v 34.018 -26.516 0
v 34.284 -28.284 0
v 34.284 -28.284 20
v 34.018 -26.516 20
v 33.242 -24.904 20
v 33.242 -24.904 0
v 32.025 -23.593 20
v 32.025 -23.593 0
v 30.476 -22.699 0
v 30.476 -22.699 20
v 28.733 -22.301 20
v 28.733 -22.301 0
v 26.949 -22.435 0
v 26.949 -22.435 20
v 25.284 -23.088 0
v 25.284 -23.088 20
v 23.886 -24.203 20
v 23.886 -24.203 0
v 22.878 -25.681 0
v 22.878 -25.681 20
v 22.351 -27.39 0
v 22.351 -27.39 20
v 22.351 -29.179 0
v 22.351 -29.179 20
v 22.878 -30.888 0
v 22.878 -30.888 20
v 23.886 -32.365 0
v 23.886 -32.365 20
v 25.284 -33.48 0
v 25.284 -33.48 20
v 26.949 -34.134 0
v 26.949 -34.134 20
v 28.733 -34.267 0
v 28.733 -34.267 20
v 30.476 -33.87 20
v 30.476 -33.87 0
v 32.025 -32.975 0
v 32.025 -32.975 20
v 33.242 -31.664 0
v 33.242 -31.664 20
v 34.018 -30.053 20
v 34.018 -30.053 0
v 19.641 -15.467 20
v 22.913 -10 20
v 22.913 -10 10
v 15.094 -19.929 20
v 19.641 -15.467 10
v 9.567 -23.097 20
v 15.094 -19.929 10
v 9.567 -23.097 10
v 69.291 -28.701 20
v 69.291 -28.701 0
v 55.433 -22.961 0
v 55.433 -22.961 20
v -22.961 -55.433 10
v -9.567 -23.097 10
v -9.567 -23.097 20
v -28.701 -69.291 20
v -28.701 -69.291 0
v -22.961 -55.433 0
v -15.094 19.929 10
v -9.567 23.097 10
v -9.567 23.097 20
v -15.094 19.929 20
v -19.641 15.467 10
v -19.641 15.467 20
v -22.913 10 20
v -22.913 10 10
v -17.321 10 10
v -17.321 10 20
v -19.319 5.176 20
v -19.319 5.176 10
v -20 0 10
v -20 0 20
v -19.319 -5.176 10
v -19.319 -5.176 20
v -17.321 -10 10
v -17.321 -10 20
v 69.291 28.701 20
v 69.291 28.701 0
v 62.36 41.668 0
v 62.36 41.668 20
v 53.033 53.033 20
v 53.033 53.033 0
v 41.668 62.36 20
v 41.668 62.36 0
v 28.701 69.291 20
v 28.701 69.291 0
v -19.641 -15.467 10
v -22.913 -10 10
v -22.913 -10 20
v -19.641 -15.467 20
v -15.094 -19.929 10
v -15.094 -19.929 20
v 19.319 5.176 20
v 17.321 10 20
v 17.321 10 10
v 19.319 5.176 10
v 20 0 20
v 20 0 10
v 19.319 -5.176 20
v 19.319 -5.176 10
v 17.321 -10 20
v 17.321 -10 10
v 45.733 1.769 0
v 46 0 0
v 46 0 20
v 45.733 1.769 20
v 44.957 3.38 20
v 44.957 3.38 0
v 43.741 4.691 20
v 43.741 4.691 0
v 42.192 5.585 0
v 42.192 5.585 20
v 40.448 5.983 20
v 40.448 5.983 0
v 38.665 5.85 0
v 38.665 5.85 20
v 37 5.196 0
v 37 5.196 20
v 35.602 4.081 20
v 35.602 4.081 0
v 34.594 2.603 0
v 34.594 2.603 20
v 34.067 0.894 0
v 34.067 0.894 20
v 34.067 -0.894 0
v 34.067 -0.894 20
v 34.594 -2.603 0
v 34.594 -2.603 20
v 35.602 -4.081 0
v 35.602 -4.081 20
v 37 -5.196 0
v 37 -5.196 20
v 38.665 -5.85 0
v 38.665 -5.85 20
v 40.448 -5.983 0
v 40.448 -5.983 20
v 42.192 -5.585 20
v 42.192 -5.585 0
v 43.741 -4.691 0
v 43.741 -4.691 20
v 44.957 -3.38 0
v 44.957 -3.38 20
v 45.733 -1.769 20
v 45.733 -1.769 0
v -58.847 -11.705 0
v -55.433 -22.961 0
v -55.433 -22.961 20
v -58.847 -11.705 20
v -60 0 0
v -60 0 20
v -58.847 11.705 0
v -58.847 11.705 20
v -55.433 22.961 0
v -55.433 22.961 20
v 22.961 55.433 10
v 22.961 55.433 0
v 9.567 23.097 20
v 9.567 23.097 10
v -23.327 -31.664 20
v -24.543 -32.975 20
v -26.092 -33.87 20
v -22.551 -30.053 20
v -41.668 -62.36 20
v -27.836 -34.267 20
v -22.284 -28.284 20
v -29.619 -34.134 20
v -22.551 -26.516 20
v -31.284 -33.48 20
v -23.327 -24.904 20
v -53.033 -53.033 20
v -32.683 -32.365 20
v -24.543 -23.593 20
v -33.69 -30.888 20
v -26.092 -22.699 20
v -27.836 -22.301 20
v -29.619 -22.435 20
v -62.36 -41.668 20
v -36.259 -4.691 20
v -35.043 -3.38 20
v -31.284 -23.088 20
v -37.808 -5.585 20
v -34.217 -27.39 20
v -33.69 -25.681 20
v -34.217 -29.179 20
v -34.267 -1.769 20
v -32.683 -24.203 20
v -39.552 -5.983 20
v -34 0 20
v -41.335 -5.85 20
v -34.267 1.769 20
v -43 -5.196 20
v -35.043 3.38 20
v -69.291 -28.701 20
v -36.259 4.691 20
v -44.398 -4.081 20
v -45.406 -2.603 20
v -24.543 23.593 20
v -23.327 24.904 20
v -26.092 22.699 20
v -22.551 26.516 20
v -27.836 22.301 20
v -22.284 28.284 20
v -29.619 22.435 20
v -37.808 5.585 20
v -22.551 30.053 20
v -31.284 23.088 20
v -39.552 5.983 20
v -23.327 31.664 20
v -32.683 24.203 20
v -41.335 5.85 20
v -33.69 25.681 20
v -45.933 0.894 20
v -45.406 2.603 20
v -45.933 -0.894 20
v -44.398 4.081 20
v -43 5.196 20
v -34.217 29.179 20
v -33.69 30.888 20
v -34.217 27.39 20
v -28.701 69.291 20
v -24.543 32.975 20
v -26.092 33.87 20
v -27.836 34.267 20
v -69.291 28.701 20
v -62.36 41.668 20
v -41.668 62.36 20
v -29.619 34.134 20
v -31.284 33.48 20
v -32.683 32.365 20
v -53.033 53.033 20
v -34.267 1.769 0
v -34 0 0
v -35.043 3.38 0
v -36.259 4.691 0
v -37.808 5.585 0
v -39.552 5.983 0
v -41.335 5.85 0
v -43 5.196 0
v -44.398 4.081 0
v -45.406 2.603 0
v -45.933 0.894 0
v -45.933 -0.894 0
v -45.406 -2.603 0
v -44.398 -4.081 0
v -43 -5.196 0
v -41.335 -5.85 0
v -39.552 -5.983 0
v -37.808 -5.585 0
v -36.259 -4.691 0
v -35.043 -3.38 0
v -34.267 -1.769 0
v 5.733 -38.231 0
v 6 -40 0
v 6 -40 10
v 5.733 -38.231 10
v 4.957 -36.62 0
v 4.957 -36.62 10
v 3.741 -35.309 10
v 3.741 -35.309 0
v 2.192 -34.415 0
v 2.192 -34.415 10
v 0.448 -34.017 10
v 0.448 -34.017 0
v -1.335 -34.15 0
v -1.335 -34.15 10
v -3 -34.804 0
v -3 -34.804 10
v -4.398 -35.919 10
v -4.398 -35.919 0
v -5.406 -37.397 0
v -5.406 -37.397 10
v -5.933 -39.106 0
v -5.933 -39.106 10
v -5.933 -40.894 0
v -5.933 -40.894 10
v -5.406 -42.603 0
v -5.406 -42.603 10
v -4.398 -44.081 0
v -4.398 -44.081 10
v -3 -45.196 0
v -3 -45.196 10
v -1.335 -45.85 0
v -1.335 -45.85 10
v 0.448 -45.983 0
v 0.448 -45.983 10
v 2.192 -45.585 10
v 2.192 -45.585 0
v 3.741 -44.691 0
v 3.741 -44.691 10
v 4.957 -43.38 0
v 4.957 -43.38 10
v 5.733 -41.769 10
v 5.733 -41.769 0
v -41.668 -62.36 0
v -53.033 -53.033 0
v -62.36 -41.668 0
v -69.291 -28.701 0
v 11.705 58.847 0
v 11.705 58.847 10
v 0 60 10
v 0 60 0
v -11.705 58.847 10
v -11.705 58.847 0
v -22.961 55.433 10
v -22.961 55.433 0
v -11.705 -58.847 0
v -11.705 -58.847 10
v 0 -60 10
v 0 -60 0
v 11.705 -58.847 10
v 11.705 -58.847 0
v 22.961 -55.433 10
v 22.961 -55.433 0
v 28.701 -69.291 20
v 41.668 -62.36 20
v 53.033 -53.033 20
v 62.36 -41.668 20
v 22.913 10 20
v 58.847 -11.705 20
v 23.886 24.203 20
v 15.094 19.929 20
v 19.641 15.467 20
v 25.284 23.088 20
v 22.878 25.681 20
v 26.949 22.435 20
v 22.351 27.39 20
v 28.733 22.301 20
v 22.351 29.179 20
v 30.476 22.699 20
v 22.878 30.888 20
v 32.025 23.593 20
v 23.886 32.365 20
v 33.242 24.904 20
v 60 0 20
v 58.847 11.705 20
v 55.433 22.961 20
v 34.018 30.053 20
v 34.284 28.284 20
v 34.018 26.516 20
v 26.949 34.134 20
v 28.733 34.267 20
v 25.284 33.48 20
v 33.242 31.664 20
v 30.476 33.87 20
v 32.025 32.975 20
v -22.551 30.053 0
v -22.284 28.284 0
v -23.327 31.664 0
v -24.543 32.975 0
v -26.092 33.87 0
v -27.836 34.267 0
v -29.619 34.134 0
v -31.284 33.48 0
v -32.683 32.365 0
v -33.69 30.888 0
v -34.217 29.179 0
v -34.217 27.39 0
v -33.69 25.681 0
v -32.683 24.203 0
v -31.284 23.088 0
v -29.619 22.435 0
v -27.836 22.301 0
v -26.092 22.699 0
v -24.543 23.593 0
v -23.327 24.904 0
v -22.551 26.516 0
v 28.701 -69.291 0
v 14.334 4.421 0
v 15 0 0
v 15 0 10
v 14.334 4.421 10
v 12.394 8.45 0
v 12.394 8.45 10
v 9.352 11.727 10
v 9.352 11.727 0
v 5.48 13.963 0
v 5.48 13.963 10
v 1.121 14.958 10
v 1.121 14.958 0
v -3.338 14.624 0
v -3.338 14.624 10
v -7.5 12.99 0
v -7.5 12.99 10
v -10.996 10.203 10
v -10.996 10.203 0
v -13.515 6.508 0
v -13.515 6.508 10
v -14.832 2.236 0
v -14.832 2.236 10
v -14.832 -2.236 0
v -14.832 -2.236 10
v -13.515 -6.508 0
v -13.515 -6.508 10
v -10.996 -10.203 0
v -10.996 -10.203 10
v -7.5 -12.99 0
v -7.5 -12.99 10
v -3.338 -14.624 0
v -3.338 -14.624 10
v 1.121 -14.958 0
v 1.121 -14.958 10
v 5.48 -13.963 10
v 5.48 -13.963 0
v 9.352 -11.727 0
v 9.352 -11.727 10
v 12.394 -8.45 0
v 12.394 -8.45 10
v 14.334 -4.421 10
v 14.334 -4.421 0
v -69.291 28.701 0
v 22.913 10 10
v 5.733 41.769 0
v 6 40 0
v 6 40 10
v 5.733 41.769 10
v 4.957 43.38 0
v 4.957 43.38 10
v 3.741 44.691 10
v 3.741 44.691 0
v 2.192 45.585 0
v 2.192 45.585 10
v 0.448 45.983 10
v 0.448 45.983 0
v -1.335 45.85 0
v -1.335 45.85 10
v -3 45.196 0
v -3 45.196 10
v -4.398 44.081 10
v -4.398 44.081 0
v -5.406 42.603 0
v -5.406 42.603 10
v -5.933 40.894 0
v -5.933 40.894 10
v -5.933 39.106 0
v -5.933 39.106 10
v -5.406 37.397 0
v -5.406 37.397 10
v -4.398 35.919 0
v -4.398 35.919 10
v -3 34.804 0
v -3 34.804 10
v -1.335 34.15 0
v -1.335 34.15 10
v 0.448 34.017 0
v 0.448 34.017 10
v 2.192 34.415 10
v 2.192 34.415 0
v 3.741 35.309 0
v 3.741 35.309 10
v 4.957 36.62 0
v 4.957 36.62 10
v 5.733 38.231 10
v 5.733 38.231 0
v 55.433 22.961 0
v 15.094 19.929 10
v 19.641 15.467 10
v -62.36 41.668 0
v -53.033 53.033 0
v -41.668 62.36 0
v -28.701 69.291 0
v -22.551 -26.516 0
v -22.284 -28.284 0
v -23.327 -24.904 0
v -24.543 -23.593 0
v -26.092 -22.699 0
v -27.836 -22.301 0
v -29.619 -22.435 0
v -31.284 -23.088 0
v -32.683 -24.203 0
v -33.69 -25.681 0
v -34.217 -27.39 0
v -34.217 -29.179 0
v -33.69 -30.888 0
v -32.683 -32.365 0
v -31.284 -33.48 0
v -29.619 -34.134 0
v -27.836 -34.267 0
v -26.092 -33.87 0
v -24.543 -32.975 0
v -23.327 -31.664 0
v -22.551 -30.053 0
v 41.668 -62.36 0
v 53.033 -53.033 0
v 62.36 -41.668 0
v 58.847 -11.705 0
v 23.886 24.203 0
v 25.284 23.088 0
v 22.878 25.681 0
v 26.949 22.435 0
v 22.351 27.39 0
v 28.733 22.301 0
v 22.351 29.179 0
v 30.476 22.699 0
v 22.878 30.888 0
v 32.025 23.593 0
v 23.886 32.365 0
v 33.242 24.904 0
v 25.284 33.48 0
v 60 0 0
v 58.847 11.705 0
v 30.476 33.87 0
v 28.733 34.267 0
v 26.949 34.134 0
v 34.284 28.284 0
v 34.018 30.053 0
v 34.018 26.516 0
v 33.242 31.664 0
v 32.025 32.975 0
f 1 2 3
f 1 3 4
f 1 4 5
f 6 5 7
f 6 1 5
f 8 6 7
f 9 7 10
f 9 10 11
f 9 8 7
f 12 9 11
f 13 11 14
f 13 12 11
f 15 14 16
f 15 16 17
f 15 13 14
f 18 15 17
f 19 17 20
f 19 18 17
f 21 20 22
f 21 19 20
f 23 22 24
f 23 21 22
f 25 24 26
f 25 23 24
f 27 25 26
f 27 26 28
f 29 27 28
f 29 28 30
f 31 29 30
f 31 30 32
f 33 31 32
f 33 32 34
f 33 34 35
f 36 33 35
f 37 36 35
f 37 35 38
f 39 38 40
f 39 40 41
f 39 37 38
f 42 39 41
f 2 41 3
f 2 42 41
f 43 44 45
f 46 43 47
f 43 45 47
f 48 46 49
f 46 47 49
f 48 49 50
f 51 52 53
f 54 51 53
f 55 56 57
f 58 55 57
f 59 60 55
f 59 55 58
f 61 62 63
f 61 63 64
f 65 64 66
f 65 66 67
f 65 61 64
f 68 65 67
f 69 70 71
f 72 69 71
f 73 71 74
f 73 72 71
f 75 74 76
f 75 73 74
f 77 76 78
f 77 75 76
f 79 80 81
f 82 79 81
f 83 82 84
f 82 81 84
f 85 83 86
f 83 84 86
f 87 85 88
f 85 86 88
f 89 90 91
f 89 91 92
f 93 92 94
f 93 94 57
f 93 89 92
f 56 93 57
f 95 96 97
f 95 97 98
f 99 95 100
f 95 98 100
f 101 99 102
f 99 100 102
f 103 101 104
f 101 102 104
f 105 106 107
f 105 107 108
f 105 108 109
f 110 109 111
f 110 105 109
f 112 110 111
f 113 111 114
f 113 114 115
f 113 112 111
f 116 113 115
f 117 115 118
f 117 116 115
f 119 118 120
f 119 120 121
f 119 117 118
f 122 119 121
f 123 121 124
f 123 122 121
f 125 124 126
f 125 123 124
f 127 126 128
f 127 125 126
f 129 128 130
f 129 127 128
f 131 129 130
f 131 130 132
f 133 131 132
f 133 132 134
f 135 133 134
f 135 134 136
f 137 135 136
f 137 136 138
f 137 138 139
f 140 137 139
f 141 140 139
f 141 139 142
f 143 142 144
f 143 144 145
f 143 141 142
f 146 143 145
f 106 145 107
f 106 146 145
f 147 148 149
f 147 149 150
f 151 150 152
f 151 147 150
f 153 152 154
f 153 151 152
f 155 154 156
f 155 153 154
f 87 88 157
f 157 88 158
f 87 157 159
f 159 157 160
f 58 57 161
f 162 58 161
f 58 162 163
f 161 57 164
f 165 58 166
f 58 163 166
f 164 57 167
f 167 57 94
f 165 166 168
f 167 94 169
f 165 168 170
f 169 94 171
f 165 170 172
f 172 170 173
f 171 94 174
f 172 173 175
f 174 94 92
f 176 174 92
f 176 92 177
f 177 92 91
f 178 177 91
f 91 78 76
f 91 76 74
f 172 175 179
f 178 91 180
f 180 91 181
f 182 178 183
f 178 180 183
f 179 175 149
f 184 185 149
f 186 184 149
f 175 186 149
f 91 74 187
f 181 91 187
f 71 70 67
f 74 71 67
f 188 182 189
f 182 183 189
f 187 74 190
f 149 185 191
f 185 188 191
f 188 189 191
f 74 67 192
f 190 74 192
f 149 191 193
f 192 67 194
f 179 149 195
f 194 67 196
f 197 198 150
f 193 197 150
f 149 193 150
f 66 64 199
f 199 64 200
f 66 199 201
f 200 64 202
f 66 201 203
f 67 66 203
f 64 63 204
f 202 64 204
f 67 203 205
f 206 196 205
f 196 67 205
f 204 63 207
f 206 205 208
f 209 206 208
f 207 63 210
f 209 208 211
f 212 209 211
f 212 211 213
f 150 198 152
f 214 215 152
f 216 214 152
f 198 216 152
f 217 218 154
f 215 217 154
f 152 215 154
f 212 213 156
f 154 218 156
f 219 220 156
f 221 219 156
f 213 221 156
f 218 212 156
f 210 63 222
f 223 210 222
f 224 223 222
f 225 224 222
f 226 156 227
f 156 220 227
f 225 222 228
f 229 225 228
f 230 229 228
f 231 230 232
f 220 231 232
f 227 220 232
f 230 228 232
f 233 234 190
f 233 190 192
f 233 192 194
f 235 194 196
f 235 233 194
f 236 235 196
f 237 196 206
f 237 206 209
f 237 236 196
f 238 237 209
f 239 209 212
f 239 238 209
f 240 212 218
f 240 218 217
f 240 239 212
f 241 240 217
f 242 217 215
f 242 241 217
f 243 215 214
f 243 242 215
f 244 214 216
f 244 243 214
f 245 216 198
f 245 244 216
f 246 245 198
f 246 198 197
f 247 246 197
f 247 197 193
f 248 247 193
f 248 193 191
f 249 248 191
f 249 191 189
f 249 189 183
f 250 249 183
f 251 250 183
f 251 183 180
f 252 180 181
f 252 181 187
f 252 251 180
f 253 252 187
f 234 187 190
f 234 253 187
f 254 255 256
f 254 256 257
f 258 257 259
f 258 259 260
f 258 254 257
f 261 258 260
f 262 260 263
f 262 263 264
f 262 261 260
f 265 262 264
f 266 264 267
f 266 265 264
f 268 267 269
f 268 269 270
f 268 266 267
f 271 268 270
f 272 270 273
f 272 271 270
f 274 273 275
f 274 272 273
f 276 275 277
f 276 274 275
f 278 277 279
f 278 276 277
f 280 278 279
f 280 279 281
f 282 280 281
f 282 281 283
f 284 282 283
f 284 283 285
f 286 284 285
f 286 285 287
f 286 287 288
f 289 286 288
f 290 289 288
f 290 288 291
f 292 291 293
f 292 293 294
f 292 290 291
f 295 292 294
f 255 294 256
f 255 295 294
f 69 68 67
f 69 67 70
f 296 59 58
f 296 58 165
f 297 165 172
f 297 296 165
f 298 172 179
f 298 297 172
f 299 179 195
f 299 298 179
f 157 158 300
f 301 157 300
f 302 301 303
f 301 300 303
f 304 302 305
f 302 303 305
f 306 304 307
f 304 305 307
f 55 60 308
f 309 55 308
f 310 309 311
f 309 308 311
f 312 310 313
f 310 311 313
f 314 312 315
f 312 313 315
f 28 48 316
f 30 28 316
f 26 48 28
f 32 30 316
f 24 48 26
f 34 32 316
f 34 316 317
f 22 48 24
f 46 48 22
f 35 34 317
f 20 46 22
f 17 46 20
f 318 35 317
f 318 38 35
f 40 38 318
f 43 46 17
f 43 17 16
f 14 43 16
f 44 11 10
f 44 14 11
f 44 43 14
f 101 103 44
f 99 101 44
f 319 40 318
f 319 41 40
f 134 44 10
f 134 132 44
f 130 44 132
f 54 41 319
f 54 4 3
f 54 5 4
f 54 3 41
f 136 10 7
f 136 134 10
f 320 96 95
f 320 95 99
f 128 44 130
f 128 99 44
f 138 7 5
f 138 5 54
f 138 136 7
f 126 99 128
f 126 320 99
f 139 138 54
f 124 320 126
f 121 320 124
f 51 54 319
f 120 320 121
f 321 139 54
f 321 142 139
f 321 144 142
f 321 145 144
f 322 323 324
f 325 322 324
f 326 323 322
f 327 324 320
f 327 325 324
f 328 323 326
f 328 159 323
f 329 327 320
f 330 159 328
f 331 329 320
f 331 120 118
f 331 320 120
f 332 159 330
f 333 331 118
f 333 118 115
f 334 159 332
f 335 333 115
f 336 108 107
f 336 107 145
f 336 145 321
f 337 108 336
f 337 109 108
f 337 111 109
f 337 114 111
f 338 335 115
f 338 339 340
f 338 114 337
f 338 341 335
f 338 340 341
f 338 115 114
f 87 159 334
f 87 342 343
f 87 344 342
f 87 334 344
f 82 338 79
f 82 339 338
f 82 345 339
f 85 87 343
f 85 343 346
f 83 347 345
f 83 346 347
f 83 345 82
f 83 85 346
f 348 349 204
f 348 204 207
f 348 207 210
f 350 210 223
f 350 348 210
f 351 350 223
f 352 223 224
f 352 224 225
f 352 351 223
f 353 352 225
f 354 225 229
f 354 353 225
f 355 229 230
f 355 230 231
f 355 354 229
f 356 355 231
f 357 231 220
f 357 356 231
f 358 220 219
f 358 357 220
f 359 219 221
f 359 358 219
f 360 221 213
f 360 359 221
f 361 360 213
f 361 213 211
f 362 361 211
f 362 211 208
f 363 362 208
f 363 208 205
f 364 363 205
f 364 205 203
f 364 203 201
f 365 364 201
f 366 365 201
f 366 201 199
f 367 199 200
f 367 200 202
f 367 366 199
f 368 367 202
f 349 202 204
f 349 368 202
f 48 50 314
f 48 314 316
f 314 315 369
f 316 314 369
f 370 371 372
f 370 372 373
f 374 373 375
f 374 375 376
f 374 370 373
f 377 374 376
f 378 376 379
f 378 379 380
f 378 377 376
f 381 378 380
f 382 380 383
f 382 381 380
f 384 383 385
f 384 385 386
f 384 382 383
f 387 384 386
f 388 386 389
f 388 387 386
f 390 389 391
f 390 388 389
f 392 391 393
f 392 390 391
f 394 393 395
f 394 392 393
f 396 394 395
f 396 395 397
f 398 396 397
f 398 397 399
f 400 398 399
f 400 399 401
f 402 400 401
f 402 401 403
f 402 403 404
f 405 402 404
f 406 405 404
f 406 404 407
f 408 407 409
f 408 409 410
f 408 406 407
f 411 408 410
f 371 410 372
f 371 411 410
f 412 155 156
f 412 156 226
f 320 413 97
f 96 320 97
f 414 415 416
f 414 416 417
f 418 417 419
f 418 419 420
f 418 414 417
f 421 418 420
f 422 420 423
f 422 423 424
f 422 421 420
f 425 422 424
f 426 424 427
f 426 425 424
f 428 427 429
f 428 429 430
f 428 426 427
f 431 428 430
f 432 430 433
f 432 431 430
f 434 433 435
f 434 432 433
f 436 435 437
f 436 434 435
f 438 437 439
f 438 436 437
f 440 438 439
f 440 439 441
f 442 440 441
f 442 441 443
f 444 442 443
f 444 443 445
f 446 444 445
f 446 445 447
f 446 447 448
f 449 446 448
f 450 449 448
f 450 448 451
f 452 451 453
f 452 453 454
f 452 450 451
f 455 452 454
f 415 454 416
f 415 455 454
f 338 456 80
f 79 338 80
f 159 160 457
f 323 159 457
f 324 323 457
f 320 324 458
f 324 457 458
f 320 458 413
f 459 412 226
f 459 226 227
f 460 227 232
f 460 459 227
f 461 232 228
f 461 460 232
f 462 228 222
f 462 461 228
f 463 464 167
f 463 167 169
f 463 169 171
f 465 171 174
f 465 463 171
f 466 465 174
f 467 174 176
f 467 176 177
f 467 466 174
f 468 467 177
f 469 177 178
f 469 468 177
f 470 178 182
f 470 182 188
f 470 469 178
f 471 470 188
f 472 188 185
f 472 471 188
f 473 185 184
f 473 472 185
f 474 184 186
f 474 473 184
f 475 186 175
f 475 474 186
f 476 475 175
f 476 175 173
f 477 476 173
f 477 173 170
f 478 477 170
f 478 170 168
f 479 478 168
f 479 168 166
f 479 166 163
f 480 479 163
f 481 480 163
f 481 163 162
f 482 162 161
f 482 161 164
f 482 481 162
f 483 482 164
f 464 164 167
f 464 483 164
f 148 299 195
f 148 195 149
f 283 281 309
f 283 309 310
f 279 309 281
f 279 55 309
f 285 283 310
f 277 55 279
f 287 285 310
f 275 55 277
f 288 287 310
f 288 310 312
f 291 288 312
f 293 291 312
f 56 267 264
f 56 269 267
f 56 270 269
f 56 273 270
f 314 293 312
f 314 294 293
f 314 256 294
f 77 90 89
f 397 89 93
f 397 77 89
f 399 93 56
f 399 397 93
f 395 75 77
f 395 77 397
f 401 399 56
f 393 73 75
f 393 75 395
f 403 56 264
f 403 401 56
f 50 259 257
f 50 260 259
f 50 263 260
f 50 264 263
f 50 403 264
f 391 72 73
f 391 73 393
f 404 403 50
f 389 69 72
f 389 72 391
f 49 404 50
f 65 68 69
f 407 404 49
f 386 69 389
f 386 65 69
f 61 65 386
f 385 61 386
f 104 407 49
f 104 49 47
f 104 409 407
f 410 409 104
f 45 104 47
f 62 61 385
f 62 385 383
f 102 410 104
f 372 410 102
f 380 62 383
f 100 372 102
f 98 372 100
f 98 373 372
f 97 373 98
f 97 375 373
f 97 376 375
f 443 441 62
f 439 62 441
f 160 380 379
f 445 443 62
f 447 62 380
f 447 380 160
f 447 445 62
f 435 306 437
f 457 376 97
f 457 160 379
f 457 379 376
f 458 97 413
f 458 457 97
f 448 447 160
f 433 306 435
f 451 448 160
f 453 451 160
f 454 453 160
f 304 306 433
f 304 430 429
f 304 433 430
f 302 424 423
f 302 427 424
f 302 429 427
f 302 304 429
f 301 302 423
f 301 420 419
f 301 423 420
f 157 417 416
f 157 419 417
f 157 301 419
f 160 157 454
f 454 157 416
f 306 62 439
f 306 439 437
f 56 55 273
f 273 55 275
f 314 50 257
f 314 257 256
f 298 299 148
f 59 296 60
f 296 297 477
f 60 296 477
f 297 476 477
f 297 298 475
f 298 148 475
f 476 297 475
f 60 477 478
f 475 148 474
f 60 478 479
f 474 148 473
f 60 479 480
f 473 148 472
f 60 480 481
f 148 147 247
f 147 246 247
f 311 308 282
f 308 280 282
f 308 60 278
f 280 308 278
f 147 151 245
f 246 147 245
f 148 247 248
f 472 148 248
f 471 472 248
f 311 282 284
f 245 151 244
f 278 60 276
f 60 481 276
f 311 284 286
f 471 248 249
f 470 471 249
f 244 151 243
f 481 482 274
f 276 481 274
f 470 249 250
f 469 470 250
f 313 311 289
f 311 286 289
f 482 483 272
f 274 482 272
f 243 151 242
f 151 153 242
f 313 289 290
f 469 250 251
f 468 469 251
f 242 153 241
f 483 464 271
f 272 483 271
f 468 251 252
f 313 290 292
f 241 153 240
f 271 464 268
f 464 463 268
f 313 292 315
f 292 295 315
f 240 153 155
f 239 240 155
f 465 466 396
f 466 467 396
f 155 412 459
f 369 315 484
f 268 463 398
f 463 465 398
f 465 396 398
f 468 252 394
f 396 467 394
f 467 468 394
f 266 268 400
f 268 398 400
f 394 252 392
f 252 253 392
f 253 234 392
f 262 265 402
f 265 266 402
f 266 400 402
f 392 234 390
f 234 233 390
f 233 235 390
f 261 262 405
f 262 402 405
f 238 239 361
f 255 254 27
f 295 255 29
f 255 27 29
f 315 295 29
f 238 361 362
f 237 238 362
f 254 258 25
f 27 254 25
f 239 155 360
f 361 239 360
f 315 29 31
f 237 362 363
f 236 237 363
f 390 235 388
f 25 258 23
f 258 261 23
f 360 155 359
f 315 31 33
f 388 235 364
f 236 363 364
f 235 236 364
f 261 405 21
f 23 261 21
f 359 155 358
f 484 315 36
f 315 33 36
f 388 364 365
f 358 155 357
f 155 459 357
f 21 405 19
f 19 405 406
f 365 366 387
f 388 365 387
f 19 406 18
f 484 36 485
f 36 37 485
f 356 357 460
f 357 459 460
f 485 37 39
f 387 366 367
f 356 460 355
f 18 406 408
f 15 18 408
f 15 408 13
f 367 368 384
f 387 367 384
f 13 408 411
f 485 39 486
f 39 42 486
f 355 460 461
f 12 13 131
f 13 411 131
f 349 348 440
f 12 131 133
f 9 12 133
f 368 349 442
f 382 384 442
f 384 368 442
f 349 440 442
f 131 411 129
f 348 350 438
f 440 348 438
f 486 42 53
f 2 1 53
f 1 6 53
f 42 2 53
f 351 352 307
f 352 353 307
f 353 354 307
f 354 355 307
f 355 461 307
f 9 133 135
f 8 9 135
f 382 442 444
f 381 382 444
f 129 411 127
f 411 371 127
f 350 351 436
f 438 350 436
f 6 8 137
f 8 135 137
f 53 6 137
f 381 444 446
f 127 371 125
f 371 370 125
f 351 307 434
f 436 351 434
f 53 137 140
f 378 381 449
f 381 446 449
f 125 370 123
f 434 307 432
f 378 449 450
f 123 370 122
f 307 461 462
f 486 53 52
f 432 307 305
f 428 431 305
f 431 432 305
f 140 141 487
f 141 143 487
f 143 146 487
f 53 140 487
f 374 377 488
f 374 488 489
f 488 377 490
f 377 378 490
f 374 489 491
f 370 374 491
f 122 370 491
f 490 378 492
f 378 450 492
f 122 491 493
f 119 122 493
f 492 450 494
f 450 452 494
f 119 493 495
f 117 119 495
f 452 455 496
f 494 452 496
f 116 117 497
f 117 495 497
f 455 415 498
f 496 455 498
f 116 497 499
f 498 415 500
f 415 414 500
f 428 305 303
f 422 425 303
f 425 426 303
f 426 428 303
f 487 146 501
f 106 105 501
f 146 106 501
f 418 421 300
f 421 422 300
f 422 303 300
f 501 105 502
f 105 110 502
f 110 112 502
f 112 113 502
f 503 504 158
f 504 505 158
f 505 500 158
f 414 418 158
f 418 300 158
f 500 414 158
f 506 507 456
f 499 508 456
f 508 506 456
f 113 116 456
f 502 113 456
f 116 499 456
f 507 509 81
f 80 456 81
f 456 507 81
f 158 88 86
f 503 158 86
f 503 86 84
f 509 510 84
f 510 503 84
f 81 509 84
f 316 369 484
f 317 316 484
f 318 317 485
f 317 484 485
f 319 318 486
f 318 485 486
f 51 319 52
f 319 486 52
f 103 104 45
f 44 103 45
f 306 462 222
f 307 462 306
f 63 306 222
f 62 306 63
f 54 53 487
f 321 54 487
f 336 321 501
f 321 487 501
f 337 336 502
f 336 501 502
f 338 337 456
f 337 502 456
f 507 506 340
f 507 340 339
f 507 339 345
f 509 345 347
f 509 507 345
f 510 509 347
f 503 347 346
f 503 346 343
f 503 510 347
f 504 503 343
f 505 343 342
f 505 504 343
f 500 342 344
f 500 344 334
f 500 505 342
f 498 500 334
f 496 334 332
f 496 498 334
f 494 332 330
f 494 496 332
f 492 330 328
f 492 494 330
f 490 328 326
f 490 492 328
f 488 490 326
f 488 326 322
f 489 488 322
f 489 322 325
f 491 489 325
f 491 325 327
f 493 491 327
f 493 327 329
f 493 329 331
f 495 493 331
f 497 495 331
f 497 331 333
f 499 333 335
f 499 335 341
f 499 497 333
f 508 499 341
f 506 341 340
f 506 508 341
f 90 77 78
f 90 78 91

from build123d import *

# Parameters (mm, degrees)
SKETCH1_R             = 6
BOSS_EXTRUDE1_DEPTH   = 20
BOSS_EXTRUDE1_2_DEPTH = 20
SKETCH1_3_R           = 6
SKETCH1_3_R_2         = 15
BOSS_EXTRUDE2_DEPTH   = 10


with BuildPart() as part:
    # Sketch1 → Boss-Extrude1 (new body)
    with BuildSketch(Plane.XY):
        with BuildLine():
            Line((22.912878475, 10), (17.320508076, 10))
            ThreePointArc((17.320508076, 10), (20, 0), (17.320508076, -10))
            Line((17.320508076, -10), (22.912878475, -10))
            ThreePointArc((22.912878475, -10), (17.510562404, -17.843211715), (9.567085809, -23.096988313))
            Line((9.567085809, -23.096988313), (28.701257427, -69.290964938))
            ThreePointArc((28.701257427, -69.290964938), (53.033008589, -53.033008589), (69.290964938, -28.701257427))
            Line((69.290964938, -28.701257427), (55.432771951, -22.961005942))
            ThreePointArc((55.432771951, -22.961005942), (60, 0), (55.432771951, 22.961005942))
            Line((55.432771951, 22.961005942), (69.290964938, 28.701257427))
            ThreePointArc((69.290964938, 28.701257427), (53.033008589, 53.033008589), (28.701257427, 69.290964938))
            Line((28.701257427, 69.290964938), (9.567085809, 23.096988313))
            ThreePointArc((9.567085809, 23.096988313), (17.510562404, 17.843211715), (22.912878475, 10))
        make_face()
        with Locations((28.284271247, -28.284271247)):
            Circle(SKETCH1_R, mode=Mode.SUBTRACT)
        with Locations((28.284271247, 28.284271247)):
            Circle(SKETCH1_R, mode=Mode.SUBTRACT)
        with Locations((40, 0)):
            Circle(SKETCH1_R, mode=Mode.SUBTRACT)
    extrude(amount=BOSS_EXTRUDE1_DEPTH)



with BuildPart() as body_2:
    # Sketch1 → Boss-Extrude1 2 (new body)
    with BuildSketch(Plane.XY):
        with BuildLine():
            Line((-9.567085809, 23.096988313), (-28.701257427, 69.290964938))
            ThreePointArc((-28.701257427, 69.290964938), (-53.033008589, 53.033008589), (-69.290964938, 28.701257427))
            Line((-69.290964938, 28.701257427), (-55.432771951, 22.961005942))
            ThreePointArc((-55.432771951, 22.961005942), (-60, 0), (-55.432771951, -22.961005942))
            Line((-55.432771951, -22.961005942), (-69.290964938, -28.701257427))
            ThreePointArc((-69.290964938, -28.701257427), (-53.033008589, -53.033008589), (-28.701257427, -69.290964938))
            Line((-28.701257427, -69.290964938), (-9.567085809, -23.096988313))
            ThreePointArc((-9.567085809, -23.096988313), (-17.510562404, -17.843211715), (-22.912878475, -10))
            Line((-22.912878475, -10), (-17.320508076, -10))
            ThreePointArc((-17.320508076, -10), (-20, 0), (-17.320508076, 10))
            Line((-17.320508076, 10), (-22.912878475, 10))
            ThreePointArc((-22.912878475, 10), (-17.510562404, 17.843211715), (-9.567085809, 23.096988313))
        make_face()
        with Locations((-28.284271247, -28.284271247)):
            Circle(SKETCH1_R, mode=Mode.SUBTRACT)
        with Locations((-40, 0)):
            Circle(SKETCH1_R, mode=Mode.SUBTRACT)
        with Locations((-28.284271247, 28.284271247)):
            Circle(SKETCH1_R, mode=Mode.SUBTRACT)
    extrude(amount=BOSS_EXTRUDE1_2_DEPTH)


with BuildPart() as part_1:
    add(part.part)

    add(body_2.part)  # Boss-Extrude2 merges body 2
    # Sketch1<3> → Boss-Extrude2 (add)
    with BuildSketch(Plane.XY):
        with BuildLine():
            ThreePointArc((17.320508076, -10), (20, 0), (17.320508076, 10))
            Line((17.320508076, 10), (22.912878475, 10))
            ThreePointArc((22.912878475, 10), (17.510562404, 17.843211715), (9.567085809, 23.096988313))
            Line((9.567085809, 23.096988313), (22.961005942, 55.432771951))
            ThreePointArc((22.961005942, 55.432771951), (0, 60), (-22.961005942, 55.432771951))
            Line((-22.961005942, 55.432771951), (-9.567085809, 23.096988313))
            ThreePointArc((-9.567085809, 23.096988313), (-17.510562404, 17.843211715), (-22.912878475, 10))
            Line((-22.912878475, 10), (-17.320508076, 10))
            ThreePointArc((-17.320508076, 10), (-20, 0), (-17.320508076, -10))
            Line((-17.320508076, -10), (-22.912878475, -10))
            ThreePointArc((-22.912878475, -10), (-17.510562404, -17.843211715), (-9.567085809, -23.096988313))
            Line((-9.567085809, -23.096988313), (-22.961005942, -55.432771951))
            ThreePointArc((-22.961005942, -55.432771951), (0, -60), (22.961005942, -55.432771951))
            Line((22.961005942, -55.432771951), (9.567085809, -23.096988313))
            ThreePointArc((9.567085809, -23.096988313), (17.510562404, -17.843211715), (22.912878475, -10))
            Line((22.912878475, -10), (17.320508076, -10))
        make_face()
        with Locations((0, -40)):
            Circle(SKETCH1_3_R, mode=Mode.SUBTRACT)
        Circle(SKETCH1_3_R_2, mode=Mode.SUBTRACT)
        with Locations((0, 40)):
            Circle(SKETCH1_3_R, mode=Mode.SUBTRACT)
    extrude(amount=BOSS_EXTRUDE2_DEPTH)


solid = part_1.part
